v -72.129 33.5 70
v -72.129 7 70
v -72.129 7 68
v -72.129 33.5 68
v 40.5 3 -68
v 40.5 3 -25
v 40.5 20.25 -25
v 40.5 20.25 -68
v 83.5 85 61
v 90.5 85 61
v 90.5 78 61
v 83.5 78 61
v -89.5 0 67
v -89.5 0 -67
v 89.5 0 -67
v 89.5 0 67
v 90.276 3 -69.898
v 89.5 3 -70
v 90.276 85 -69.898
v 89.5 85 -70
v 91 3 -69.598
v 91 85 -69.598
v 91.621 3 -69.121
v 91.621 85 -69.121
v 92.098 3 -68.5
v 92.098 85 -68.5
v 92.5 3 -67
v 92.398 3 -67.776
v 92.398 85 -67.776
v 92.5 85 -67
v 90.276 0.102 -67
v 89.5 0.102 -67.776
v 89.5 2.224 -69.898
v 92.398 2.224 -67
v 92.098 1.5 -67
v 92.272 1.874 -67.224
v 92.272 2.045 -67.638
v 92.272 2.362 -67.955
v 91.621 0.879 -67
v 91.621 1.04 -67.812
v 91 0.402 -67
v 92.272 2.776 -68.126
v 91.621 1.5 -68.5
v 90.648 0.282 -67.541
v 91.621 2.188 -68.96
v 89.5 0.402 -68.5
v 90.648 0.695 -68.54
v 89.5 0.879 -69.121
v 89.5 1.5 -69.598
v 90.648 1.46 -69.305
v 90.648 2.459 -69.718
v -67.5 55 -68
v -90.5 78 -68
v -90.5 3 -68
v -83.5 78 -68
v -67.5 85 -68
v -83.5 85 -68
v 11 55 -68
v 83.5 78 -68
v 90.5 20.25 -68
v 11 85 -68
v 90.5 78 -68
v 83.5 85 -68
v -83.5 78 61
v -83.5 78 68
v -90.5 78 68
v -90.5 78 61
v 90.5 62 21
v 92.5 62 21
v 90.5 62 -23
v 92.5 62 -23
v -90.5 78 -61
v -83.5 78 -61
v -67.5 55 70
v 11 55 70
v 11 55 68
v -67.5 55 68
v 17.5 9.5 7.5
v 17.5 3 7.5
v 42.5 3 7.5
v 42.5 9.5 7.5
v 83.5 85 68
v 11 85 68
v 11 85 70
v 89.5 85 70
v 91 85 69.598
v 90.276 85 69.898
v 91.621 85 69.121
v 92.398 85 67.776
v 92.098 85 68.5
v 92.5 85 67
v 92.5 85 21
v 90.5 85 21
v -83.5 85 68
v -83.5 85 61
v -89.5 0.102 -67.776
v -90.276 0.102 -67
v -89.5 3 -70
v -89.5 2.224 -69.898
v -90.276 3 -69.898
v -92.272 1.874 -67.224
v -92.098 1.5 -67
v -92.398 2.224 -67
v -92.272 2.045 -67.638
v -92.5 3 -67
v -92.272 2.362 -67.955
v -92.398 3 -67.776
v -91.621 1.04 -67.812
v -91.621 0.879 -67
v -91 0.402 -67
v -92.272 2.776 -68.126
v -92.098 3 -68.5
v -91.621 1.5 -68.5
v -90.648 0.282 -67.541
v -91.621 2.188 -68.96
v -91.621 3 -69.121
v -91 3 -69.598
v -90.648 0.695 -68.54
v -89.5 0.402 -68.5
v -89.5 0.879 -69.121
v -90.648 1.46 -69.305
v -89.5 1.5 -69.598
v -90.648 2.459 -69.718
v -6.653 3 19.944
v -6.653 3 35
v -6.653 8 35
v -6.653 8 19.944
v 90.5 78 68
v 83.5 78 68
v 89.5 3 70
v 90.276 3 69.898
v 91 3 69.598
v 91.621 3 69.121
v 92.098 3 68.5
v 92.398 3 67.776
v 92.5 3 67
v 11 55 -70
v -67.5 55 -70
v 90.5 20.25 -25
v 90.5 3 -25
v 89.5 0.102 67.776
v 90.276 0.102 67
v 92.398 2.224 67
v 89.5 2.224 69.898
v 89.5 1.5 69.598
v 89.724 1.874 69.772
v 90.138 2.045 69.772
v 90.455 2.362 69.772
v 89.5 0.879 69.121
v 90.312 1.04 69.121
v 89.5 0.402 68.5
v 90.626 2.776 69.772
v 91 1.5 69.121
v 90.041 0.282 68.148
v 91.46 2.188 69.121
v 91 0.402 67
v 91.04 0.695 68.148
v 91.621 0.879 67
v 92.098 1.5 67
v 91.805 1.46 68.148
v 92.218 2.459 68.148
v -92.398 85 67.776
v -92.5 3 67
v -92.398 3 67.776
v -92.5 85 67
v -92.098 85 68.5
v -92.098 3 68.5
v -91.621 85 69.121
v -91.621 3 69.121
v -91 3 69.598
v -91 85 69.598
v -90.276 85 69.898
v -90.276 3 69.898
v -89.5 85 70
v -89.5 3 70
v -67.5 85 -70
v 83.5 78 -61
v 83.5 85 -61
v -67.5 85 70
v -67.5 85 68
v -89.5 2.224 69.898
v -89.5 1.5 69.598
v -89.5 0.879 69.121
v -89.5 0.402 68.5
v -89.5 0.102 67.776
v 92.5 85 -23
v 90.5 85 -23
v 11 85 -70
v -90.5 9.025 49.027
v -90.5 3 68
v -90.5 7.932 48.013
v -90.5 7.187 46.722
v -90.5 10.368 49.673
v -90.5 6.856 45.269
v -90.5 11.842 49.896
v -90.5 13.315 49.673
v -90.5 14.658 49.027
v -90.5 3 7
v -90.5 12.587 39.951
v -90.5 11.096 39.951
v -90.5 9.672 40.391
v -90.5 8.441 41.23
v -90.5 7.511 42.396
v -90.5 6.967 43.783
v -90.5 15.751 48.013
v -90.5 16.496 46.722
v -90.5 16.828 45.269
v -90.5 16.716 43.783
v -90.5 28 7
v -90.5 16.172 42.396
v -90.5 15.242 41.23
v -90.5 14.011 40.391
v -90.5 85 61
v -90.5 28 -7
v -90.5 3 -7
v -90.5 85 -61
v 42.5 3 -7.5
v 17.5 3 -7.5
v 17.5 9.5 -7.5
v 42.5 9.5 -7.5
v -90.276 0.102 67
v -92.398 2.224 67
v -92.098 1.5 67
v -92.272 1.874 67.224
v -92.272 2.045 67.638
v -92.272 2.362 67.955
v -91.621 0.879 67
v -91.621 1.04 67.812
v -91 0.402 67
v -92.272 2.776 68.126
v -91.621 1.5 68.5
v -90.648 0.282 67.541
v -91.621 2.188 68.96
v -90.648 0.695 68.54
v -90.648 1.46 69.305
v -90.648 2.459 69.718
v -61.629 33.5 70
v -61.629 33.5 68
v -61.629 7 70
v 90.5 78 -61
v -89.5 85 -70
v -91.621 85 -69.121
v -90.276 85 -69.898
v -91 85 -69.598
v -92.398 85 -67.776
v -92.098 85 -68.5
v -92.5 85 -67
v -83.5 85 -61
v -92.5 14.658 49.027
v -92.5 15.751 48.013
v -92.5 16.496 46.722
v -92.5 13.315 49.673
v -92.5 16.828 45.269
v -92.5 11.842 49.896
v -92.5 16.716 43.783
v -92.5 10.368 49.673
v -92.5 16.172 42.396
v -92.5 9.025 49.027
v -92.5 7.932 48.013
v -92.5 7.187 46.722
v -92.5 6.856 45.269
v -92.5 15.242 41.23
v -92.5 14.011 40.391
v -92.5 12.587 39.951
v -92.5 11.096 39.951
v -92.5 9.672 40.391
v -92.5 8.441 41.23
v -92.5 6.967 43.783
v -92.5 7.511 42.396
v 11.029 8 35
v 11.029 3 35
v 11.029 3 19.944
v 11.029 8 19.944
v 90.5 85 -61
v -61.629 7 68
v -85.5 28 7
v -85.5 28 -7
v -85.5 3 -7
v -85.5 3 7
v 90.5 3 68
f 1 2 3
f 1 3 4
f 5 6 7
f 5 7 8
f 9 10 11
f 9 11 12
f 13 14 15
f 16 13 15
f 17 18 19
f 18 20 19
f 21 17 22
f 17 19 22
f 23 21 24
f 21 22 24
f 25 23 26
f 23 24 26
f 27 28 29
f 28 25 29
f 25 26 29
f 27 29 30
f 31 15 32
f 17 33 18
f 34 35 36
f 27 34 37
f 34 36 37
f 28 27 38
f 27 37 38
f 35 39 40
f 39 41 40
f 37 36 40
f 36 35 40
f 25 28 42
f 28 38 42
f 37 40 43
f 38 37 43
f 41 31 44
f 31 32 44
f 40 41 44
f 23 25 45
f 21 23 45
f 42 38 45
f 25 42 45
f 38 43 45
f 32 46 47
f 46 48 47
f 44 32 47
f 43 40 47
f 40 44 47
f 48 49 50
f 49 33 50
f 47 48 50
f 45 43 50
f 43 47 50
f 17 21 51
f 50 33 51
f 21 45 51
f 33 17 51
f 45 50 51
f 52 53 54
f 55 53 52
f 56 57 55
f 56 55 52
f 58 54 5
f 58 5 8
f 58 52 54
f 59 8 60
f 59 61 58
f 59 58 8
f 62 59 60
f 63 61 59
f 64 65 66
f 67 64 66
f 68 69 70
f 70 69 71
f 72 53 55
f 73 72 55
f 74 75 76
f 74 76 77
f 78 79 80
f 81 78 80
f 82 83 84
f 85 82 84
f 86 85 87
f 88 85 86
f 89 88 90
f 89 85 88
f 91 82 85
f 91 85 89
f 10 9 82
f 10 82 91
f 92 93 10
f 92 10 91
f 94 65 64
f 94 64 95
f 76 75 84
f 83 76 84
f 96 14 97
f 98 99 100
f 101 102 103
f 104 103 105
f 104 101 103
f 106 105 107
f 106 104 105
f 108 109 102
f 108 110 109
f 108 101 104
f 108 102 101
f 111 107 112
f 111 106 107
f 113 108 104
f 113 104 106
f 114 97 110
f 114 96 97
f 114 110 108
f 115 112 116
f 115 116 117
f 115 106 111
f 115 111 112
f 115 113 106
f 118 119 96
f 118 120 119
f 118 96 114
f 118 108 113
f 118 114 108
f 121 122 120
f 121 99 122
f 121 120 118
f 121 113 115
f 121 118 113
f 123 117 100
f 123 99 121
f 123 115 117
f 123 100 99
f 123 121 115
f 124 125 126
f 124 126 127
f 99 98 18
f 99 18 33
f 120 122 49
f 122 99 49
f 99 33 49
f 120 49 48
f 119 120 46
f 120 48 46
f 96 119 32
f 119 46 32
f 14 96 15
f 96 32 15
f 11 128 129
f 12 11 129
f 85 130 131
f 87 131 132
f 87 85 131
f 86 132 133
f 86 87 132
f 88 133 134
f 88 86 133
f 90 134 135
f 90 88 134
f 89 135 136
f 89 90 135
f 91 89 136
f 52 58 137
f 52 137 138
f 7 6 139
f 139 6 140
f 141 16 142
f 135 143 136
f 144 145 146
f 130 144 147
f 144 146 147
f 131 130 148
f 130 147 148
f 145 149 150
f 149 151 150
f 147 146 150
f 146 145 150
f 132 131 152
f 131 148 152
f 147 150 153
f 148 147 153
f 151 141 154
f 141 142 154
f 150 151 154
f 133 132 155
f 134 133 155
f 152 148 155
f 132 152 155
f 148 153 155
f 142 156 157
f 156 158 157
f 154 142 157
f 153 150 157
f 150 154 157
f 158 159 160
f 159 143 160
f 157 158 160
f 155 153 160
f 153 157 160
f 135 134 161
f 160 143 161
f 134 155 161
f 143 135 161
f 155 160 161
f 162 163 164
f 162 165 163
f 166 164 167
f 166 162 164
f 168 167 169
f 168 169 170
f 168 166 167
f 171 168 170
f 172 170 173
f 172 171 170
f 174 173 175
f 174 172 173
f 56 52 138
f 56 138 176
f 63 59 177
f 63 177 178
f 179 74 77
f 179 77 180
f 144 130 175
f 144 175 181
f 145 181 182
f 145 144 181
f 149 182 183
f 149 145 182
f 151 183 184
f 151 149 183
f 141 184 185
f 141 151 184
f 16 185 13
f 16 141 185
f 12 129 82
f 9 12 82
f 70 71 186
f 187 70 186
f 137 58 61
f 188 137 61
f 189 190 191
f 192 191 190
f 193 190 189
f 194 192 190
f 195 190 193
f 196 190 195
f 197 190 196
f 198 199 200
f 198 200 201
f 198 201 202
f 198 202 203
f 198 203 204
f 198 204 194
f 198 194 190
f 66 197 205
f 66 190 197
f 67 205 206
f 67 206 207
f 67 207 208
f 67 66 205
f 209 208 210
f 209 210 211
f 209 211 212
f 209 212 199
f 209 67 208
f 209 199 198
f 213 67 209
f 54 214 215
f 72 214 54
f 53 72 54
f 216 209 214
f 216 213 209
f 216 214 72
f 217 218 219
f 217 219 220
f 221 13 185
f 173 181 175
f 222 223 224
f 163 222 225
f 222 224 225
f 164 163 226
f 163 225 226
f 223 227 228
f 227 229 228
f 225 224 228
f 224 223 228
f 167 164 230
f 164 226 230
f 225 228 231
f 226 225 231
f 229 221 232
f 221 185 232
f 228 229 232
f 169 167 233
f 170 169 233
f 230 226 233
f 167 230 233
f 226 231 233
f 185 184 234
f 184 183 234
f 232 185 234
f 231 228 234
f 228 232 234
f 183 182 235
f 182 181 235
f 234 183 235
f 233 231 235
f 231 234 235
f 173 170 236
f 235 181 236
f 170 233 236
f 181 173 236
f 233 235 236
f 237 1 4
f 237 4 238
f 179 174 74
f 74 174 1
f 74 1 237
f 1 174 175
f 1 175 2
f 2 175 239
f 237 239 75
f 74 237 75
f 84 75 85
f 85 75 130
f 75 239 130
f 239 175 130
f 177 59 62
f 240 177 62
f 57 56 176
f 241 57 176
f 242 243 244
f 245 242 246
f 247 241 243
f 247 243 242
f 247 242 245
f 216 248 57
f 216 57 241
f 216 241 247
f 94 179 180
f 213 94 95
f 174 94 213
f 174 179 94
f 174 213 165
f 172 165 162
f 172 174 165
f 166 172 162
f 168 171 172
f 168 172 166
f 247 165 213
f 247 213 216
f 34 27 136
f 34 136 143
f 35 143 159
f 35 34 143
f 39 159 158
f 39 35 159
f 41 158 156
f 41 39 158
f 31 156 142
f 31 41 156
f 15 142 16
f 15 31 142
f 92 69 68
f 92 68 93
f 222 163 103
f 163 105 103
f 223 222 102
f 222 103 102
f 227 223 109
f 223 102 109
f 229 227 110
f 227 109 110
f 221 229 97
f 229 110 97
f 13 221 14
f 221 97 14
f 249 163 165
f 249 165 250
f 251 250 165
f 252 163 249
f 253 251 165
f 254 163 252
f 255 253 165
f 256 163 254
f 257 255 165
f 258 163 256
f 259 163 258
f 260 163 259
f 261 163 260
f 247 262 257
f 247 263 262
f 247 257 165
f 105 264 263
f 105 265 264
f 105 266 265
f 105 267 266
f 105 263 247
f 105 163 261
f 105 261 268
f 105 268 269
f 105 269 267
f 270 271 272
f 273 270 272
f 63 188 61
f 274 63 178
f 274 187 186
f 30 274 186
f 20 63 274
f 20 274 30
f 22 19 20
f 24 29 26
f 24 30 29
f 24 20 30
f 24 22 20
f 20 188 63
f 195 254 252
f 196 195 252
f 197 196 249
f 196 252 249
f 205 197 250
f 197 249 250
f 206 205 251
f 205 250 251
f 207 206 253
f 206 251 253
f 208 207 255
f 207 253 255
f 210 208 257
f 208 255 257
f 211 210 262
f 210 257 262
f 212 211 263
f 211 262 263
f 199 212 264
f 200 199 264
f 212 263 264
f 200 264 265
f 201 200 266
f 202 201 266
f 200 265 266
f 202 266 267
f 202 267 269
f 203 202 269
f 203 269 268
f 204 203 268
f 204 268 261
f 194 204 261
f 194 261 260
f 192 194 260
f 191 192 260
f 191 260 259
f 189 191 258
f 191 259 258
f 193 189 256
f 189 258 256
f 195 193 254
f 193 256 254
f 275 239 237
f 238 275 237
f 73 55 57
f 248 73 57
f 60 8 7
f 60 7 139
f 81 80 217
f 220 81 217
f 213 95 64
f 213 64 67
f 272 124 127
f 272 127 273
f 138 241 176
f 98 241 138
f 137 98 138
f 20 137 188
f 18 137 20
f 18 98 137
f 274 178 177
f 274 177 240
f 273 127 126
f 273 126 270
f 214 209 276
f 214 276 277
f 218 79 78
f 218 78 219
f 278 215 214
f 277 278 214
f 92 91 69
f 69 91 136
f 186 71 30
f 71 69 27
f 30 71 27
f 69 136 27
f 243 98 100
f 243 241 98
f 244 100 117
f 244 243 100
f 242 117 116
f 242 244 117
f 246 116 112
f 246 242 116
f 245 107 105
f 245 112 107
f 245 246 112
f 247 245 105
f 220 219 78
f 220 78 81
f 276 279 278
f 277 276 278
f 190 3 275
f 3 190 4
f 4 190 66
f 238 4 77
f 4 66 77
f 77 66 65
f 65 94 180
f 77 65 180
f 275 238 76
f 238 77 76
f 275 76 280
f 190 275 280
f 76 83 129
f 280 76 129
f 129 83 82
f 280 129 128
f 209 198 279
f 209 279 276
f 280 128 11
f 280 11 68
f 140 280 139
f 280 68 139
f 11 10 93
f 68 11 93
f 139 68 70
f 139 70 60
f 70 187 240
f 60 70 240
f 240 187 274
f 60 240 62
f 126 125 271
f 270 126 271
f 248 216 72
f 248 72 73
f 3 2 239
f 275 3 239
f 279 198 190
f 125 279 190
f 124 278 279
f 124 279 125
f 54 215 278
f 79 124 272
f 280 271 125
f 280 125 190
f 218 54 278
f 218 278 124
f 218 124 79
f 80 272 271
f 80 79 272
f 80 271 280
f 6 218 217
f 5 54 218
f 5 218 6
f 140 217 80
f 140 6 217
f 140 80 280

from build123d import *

# Parameters (mm, degrees)
SKETCH1_W            = 185
SKETCH1_H            = 140
BOSS_EXTRUDE1_DEPTH  = 85
SKETCH2_W            = 181
SKETCH2_H            = 136
CUT_EXTRUDE1_DEPTH   = 82
CUT_EXTRUDE3_REACH   = 190.099
SKETCH3_W            = 60
SKETCH3_H            = 30
SKETCH6_W            = 7
SKETCH6_H            = 7
BOSS_EXTRUDE2_DEPTH  = 7
SKETCH7_W            = 7
SKETCH7_H            = 7
BOSS_EXTRUDE3_DEPTH  = 7
SKETCH8_W            = 7
SKETCH8_H            = 7
BOSS_EXTRUDE4_DEPTH  = 7
SKETCH9_W            = 7
SKETCH9_H            = 7
BOSS_EXTRUDE5_DEPTH  = 7
SKETCH11_W           = 50
SKETCH11_H           = 43
BOSS_EXTRUDE6_DEPTH  = 17.25
SKETCH12_W           = 25
SKETCH12_H           = 15
BOSS_EXTRUDE7_DEPTH  = 6.5
SKETCH13_W           = 10
SKETCH13_H           = 30
CUT_EXTRUDE4_DEPTH   = 174
SKETCH14_W           = 14
SKETCH14_H           = 25
BOSS_EXTRUDE8_DEPTH  = 5
SKETCH21_W           = 44
SKETCH21_H           = 23
CUT_EXTRUDE11_DEPTH  = 12
SKETCH23_R           = 5
CUT_EXTRUDE12_DEPTH  = 2
FILLET2_R            = 3
CUT_EXTRUDE13_START  = -140
SKETCH24_W           = 7
SKETCH24_H           = 30
CUT_EXTRUDE13_DEPTH  = 140
CUT_EXTRUDE14_START  = -140
SKETCH25_W           = 1.5
SKETCH25_H           = 30
CUT_EXTRUDE14_DEPTH  = 140
SKETCH26_W           = 17.682031304
SKETCH26_H           = 15.055987051
BOSS_EXTRUDE12_DEPTH = 5
SKETCH27_W           = 10.5
SKETCH27_H           = 26.5
CUT_EXTRUDE15_DEPTH  = 2


with BuildPart() as part:
    # Sketch1 → Boss-Extrude1 (new body)
    with BuildSketch(Plane(origin=(0, 0, 0), x_dir=(1, 0, 0), z_dir=(0, 1, 0))):
        Rectangle(SKETCH1_W, SKETCH1_H)
    extrude(amount=BOSS_EXTRUDE1_DEPTH)

    # Sketch2 → Cut-Extrude1 (cut)
    with BuildSketch(Plane(origin=(0, 85, 0), x_dir=(1, 0, 0), z_dir=(0, 1, 0))):
        Rectangle(SKETCH2_W, SKETCH2_H)
    extrude(amount=-CUT_EXTRUDE1_DEPTH, mode=Mode.SUBTRACT)

    # Cut-Extrude3: up to this face of the body (flat: up to its plane)
    cut_extrude3_end = Plane(part.part.faces().sort_by_distance((0, 42.5, -70))[0])
    # Sketch3 → Cut-Extrude3 (cut, up to the picked face)
    with BuildSketch(Plane.XY.offset(70), mode=Mode.PRIVATE) as cut_extrude3_sk1:
        with Locations((-37.5, 70)):
            Rectangle(SKETCH3_W, SKETCH3_H)
    cut_extrude3_tool1 = split(extrude(cut_extrude3_sk1.sketch, amount=-CUT_EXTRUDE3_REACH, mode=Mode.PRIVATE), bisect_by=cut_extrude3_end, keep=Keep.BOTH, mode=Mode.PRIVATE)
    add(cut_extrude3_tool1.solids().sort_by(Axis((-37.5, 70, 70), (0, 0, -1)))[0], mode=Mode.SUBTRACT)

    # Sketch6 → Boss-Extrude2 (add)
    with BuildSketch(Plane(origin=(0, 0, 68), x_dir=(-1, 0, 0), z_dir=(0, 0, -1))):
        with Locations((87, 81.5)):
            Rectangle(SKETCH6_W, SKETCH6_H)
    extrude(amount=BOSS_EXTRUDE2_DEPTH)

    # Sketch7 → Boss-Extrude3 (add)
    with BuildSketch(Plane.XY.offset(-68)):
        with Locations((-87, 81.5)):
            Rectangle(SKETCH7_W, SKETCH7_H)
    extrude(amount=BOSS_EXTRUDE3_DEPTH)

    # Sketch8 → Boss-Extrude4 (add)
    with BuildSketch(Plane(origin=(0, 0, 68), x_dir=(-1, 0, 0), z_dir=(0, 0, -1))):
        with Locations((-87, 81.5)):
            Rectangle(SKETCH8_W, SKETCH8_H)
    extrude(amount=BOSS_EXTRUDE4_DEPTH)

    # Sketch9 → Boss-Extrude5 (add)
    with BuildSketch(Plane.XY.offset(-68)):
        with Locations((87, 81.5)):
            Rectangle(SKETCH9_W, SKETCH9_H)
    extrude(amount=BOSS_EXTRUDE5_DEPTH)

    # Sketch11 → Boss-Extrude6 (add)
    with BuildSketch(Plane(origin=(0, 3, 0), x_dir=(1, 0, 0), z_dir=(0, 1, 0))):
        with Locations((65.5, 46.5)):
            Rectangle(SKETCH11_W, SKETCH11_H)
    extrude(amount=BOSS_EXTRUDE6_DEPTH)

    # Sketch12 → Boss-Extrude7 (add)
    with BuildSketch(Plane(origin=(0, 3, 0), x_dir=(1, 0, 0), z_dir=(0, 1, 0))):
        with Locations((30, 0)):
            Rectangle(SKETCH12_W, SKETCH12_H)
    extrude(amount=BOSS_EXTRUDE7_DEPTH)

    # Sketch13 → Cut-Extrude4 (cut)
    with BuildSketch(Plane.XY.offset(70)):
        with Locations((-2.5, 70)):
            Rectangle(SKETCH13_W, SKETCH13_H)
    extrude(amount=-CUT_EXTRUDE4_DEPTH, mode=Mode.SUBTRACT)

    # Sketch14 → Boss-Extrude8 (add)
    with BuildSketch(Plane(origin=(-90.5, 0, 0), x_dir=(0, 0, -1), z_dir=(1, 0, 0))):
        with Locations((0, 15.5)):
            Rectangle(SKETCH14_W, SKETCH14_H)
    extrude(amount=BOSS_EXTRUDE8_DEPTH)

    # Sketch21 → Cut-Extrude11 (cut)
    with BuildSketch(Plane(origin=(92.5, 0, 0), x_dir=(0, 0, -1), z_dir=(1, 0, 0))):
        with Locations((1, 73.5)):
            Rectangle(SKETCH21_W, SKETCH21_H)
    extrude(amount=-CUT_EXTRUDE11_DEPTH, mode=Mode.SUBTRACT)

    # Sketch23 → Cut-Extrude12 (cut)
    with BuildSketch(Plane.ZY.offset(92.5)):
        with Locations((44.895607786, 11.841525816)):
            Circle(SKETCH23_R)
    extrude(amount=-CUT_EXTRUDE12_DEPTH, mode=Mode.SUBTRACT)

    # Fillet2
    fillet2_edges = [part.edges().sort_by_distance(p)[0] for p in [
        (0, 0, -70),
        (92.5, 0, 0),
        (0, 0, 70),
        (-92.5, 0, 0),
        (-92.5, 42.5, -70),
        (92.5, 42.5, -70),
        (92.5, 42.5, 70),
        (-92.5, 42.5, 70),
    ]]
    fillet(fillet2_edges, radius=FILLET2_R)

    # Sketch24 → Cut-Extrude13 (cut)
    with BuildSketch(Plane(origin=(0, 0, -70), x_dir=(-1, 0, 0), z_dir=(0, 0, -1)).offset(CUT_EXTRUDE13_START)):
        with Locations((-6, 70)):
            Rectangle(SKETCH24_W, SKETCH24_H)
    extrude(amount=CUT_EXTRUDE13_DEPTH, mode=Mode.SUBTRACT)

    # Sketch25 → Cut-Extrude14 (cut)
    with BuildSketch(Plane(origin=(0, 0, -70), x_dir=(-1, 0, 0), z_dir=(0, 0, -1)).offset(CUT_EXTRUDE14_START)):
        with Locations((-10.25, 70)):
            Rectangle(SKETCH25_W, SKETCH25_H)
    extrude(amount=CUT_EXTRUDE14_DEPTH, mode=Mode.SUBTRACT)

    # Sketch26 → Boss-Extrude12 (add)
    with BuildSketch(Plane(origin=(0, 3, 0), x_dir=(1, 0, 0), z_dir=(0, 1, 0))):
        with Locations((2.188370211, -27.472006474)):
            Rectangle(SKETCH26_W, SKETCH26_H)
    extrude(amount=BOSS_EXTRUDE12_DEPTH)

    # Sketch27 → Cut-Extrude15 (cut)
    with BuildSketch(Plane.XY.offset(70)):
        with Locations((-66.878682152, 20.25)):
            Rectangle(SKETCH27_W, SKETCH27_H)
    extrude(amount=-CUT_EXTRUDE15_DEPTH, mode=Mode.SUBTRACT)


solid = part.part
